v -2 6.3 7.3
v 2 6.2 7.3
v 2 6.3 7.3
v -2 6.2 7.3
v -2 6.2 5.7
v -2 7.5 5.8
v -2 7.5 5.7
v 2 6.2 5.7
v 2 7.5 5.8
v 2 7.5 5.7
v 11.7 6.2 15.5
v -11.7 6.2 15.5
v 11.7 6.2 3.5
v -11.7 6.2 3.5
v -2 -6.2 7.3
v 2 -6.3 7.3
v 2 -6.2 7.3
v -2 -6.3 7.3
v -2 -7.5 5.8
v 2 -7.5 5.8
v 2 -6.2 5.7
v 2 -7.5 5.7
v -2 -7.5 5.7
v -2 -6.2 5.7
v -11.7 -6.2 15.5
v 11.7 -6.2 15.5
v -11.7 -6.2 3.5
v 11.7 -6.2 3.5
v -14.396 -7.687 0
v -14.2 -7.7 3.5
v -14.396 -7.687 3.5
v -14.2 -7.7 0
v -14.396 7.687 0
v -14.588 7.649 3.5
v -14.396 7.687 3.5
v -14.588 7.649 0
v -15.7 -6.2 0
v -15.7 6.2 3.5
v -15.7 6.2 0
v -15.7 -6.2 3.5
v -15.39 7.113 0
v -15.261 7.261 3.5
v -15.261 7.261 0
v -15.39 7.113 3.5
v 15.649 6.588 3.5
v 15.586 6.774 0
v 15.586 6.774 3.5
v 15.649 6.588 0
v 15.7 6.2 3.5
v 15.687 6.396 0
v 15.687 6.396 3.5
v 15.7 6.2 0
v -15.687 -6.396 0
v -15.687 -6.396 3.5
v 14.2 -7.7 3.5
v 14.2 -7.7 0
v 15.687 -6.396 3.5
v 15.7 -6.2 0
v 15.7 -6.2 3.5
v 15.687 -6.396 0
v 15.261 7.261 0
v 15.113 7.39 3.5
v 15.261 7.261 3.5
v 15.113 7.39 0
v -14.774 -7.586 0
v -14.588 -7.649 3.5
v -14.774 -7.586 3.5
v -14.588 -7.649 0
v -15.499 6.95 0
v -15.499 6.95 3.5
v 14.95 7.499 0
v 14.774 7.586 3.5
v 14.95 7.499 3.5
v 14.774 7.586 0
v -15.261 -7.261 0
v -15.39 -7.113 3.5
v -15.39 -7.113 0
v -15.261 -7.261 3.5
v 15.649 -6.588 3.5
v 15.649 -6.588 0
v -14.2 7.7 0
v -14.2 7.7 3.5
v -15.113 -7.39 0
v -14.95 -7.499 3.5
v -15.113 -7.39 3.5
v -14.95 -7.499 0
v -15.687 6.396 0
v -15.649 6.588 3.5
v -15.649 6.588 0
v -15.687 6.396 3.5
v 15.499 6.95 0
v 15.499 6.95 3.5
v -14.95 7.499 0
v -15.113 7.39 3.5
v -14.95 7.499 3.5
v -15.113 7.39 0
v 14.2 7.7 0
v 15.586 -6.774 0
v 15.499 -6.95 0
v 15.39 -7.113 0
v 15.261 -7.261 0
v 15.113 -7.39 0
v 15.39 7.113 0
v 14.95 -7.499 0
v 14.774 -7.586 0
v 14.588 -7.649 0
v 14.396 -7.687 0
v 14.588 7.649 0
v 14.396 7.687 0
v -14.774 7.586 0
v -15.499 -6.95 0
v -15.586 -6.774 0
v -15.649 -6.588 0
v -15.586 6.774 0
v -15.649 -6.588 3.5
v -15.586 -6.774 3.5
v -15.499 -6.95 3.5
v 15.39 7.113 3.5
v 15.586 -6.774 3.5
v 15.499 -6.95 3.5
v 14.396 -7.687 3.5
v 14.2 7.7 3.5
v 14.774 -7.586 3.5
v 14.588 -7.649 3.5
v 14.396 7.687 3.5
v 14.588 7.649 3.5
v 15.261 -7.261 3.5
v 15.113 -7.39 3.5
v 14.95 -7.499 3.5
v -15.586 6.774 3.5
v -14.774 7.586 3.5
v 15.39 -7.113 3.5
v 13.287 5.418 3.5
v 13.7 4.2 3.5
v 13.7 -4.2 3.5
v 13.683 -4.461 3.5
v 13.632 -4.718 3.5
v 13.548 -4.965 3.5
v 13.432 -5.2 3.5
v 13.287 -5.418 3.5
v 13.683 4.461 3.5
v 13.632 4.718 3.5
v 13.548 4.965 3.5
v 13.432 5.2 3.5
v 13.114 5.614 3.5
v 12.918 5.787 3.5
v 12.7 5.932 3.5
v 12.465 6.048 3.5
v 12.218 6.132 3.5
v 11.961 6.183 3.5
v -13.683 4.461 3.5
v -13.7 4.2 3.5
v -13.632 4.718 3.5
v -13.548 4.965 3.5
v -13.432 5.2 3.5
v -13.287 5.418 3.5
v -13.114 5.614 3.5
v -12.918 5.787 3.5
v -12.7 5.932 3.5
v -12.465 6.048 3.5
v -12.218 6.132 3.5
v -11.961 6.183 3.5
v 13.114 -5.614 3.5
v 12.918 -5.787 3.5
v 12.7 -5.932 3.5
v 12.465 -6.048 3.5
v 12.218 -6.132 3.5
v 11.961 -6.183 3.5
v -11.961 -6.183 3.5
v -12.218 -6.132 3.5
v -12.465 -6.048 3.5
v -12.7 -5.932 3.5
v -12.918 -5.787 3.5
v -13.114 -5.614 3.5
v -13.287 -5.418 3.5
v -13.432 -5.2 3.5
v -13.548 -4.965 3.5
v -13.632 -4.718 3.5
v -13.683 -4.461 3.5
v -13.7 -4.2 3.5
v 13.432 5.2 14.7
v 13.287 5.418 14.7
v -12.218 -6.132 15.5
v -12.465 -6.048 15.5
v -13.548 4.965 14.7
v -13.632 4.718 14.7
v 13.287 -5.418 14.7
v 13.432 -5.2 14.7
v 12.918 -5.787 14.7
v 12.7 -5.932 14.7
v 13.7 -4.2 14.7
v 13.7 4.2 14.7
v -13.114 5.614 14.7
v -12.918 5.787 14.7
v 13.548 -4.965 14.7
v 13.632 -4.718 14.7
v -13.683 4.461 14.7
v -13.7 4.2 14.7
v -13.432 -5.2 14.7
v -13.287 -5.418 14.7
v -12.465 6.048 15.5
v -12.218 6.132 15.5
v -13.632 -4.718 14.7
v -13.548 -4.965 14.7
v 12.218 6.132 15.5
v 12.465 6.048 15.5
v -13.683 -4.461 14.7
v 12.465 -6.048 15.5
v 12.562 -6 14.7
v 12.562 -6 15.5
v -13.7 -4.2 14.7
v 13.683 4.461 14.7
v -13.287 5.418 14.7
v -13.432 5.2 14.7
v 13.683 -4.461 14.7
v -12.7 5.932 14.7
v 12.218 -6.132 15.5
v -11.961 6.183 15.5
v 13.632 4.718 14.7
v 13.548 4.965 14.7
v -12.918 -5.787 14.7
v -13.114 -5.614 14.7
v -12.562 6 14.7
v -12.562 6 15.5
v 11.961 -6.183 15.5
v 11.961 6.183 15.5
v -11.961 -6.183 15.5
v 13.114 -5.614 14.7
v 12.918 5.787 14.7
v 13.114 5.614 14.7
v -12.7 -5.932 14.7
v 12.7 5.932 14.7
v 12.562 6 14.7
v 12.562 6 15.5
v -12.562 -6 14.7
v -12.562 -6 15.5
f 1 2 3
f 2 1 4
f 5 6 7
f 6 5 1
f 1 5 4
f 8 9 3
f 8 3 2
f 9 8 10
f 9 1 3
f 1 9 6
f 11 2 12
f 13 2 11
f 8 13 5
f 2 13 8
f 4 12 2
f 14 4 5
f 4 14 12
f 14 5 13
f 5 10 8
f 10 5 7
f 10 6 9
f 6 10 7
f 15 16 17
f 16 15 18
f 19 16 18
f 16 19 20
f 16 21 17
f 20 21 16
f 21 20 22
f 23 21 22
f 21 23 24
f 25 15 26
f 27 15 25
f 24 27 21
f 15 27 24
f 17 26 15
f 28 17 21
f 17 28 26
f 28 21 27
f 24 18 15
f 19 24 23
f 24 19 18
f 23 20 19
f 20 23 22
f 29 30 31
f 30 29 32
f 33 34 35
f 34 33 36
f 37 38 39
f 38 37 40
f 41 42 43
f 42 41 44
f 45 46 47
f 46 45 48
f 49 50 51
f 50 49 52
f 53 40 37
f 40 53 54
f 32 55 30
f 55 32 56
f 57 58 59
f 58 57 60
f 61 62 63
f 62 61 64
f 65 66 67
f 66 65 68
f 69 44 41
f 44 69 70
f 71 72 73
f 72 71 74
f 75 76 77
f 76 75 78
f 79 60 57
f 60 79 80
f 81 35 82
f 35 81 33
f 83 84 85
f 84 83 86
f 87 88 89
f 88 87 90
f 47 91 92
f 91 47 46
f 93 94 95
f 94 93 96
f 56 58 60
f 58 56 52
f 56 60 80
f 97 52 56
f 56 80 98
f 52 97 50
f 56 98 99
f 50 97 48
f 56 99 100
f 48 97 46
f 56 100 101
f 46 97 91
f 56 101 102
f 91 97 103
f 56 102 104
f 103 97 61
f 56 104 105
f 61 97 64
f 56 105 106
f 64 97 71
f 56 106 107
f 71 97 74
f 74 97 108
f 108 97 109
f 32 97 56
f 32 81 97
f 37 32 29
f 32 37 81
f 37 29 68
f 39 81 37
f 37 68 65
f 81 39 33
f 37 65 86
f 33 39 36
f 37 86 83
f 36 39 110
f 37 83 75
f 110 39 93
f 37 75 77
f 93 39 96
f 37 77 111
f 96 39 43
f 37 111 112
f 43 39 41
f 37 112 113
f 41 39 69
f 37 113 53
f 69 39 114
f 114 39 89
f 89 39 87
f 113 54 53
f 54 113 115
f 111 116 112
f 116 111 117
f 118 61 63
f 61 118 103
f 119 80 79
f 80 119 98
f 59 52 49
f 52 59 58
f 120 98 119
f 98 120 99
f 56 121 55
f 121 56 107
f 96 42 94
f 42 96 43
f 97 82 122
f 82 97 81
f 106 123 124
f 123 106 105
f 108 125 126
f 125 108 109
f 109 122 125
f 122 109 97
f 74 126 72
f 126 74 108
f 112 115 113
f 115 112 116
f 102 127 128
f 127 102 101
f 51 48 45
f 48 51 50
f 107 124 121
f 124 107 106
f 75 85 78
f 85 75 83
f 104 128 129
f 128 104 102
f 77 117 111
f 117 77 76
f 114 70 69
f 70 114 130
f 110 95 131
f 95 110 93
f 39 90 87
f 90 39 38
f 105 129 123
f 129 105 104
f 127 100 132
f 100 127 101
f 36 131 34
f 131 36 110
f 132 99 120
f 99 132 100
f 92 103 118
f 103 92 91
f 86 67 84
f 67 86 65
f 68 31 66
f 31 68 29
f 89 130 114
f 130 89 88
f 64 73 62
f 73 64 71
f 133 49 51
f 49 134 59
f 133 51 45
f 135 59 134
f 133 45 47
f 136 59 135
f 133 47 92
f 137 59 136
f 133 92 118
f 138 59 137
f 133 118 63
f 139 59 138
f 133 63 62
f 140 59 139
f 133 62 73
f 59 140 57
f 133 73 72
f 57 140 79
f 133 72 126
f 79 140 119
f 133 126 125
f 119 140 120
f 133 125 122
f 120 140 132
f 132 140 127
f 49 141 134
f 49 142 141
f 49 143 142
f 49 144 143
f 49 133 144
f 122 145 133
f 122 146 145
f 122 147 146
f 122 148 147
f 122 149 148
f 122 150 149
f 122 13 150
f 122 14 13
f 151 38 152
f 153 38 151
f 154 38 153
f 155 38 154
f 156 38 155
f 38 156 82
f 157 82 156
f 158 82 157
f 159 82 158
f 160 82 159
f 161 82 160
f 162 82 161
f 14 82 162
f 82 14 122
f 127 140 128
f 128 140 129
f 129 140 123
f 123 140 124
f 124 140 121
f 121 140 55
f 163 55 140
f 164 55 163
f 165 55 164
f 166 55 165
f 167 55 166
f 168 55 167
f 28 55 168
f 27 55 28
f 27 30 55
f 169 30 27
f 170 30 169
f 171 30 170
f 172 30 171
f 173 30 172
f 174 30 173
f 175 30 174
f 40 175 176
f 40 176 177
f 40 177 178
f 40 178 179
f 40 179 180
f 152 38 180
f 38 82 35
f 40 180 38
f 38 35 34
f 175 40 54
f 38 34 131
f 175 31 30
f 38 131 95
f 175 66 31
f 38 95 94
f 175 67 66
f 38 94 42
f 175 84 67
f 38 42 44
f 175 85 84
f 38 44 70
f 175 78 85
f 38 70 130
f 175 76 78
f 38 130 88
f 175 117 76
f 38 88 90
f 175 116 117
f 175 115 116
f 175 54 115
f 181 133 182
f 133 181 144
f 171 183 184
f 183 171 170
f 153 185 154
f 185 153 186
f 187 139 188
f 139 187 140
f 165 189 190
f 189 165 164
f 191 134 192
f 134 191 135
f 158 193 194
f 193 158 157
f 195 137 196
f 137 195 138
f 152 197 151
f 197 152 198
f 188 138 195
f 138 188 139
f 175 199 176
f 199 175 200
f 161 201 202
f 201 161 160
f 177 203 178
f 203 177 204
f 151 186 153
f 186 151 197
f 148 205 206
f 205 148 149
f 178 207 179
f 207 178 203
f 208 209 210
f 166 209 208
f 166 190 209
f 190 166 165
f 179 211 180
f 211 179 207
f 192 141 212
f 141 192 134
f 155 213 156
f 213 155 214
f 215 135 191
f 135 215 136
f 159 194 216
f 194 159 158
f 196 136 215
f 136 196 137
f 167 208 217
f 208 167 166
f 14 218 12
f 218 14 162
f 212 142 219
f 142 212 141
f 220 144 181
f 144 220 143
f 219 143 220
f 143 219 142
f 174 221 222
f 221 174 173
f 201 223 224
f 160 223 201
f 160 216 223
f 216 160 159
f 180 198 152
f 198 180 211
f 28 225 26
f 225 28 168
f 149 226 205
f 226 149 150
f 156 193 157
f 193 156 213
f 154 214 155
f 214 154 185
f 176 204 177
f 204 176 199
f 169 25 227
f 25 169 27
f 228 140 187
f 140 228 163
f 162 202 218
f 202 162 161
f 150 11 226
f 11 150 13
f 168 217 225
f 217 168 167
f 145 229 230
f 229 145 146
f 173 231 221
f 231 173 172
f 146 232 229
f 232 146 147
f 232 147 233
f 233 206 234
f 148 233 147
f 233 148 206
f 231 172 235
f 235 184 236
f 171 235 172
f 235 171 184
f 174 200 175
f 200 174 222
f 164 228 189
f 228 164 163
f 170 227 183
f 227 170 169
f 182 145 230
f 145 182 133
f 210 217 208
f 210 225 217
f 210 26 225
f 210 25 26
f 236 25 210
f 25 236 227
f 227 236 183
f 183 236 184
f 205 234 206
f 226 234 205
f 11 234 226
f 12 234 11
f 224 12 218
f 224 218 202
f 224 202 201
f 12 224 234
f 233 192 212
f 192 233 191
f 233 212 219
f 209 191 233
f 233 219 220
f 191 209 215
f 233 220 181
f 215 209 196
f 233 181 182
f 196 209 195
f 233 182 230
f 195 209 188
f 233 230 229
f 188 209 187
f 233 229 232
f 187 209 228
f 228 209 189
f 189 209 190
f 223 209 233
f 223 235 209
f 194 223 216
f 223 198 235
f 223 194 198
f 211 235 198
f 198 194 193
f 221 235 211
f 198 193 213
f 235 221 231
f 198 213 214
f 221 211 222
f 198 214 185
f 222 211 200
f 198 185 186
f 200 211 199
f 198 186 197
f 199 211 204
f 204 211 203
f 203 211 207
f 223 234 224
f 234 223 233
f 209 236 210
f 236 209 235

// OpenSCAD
// file: parameters.scad
// ============================================
// MODULAR CABLE ORGANIZER - SHARED PARAMETERS
// ============================================
// All dimensions in mm - include this in all files
// ============================================

$fn = 48;

// === TOLERANCES ===
clearance = 0.3;
port_clearance = 0.1;  // Extra clearance for port openings (reduced - 0.2 was too loose for USB-C)
wall = 1.6;

// === SLOT DIMENSIONS (2:1 aspect ratio) - scaled to 2/3 ===
slot_width = 32;  // Reduced by 1mm for more compact insert
slot_height = 16;  // Reduced by 1mm for more compact insert
slot_depth = 4;  // Reduced from 6mm - less frame depth needed

// === FRAME STRUCTURE ===
frame_wall = 0.5;   // Reduced for more compact frame
frame_border = 8;  // Increased by 10mm for mounting holes with countersink
frame_back = 2;     // Slightly thicker for snap catch strength
mount_hole_dia = 3;
countersink_dia = 6;  // Diameter of countersink for screw heads
countersink_depth = 2;  // Depth of countersink

// === GRID ===
grid_cols = 2;
grid_rows = 2;

// === INSERT BASE DIMENSIONS ===
insert_width = slot_width - (2 * clearance);
insert_height = slot_height - (2 * clearance);
insert_base_depth = slot_depth - 0.5;

// === INSERT BODY (protrudes from frame) ===
insert_body_width = insert_width - 4;
insert_body_height = insert_height - 3;
insert_body_depth = 12;  // Deep enough to accommodate male cable connectors
insert_top_thick = 1.5;  // Top platform thickness

// === SNAP TABS (on neck/body - catch on back plate) ===
snap_tab_width = 4;
snap_tab_protrude = 1.2;  // How far tab sticks out from body
snap_tab_thick = 1.5;     // Z thickness of tab
snap_tab_offset = 2.2;      // Distance from base to tab bottom on insert (increased to clear frame)

// === CONNECTOR PORT DIMENSIONS & BODY DEPTHS ===
// Port dimensions from reference blueprints
// Body depths sized to match typical male connector lengths

// USB-C: 8.4 x 2.6mm, male connector ~9mm
usbc_w = 8.4;
usbc_h = 2.6;
usbc_r = 1.0;
usbc_body_depth = 9;

// USB-A: 14.0 x 6.5mm, male connector ~13mm
usba_w = 14.0;
usba_h = 6.5;
usba_r = 0.5;
usba_body_depth = 13;

// USB Mini: 6.9 x 3.0mm, male connector ~9mm
usb_mini_w = 6.9;
usb_mini_h = 3.0;
usb_mini_r = 0.5;
usb_mini_body_depth = 9;

// USB Micro: 6.9 x 1.8mm, male connector ~7mm
usb_micro_w = 6.9;
usb_micro_h = 1.8;
usb_micro_r = 0.3;
usb_micro_body_depth = 7;

// USB-B: 8.0 x 7.5mm, male connector ~14mm
usb_b_w = 8.0;
usb_b_h = 7.5;
usb_b_r = 1.0;
usb_b_body_depth = 14;

// Lightning: 6.7 x 1.5mm, male connector ~8mm
lightning_w = 6.7;
lightning_h = 1.5;
lightning_r = 0.5;
lightning_body_depth = 8;

// HDMI: 14.0 x 4.5mm, male connector ~16mm
hdmi_w = 14.0;
hdmi_h = 4.5;
hdmi_r = 0.5;
hdmi_body_depth = 16;

// 3.5mm Audio Jack: male plug ~14mm
audio_jack_dia = 6.0;
audio_jack_body_depth = 14;

// Blank/Label: recessed area for label
label_w = 30;
label_h = 12;
label_depth = 0.8;

// === CALCULATED VALUES ===
frame_total_depth = frame_back + slot_depth;
grid_width = (grid_cols * slot_width) + ((grid_cols - 1) * frame_wall);
grid_height = (grid_rows * slot_height) + ((grid_rows - 1) * frame_wall);
frame_width = grid_width + (2 * frame_border);
frame_height_total = grid_height + (2 * frame_border);
insert_total_depth = insert_base_depth + insert_body_depth;
// file: insert_base.scad
// ============================================
// MODULAR CABLE ORGANIZER - BASE INSERT MODULE
// ============================================
// This is the parent module for all insert types
// Include this file and call insert_with_port() with a port shape
// ============================================

include <parameters.scad>

// === BASE INSERT WITH CUSTOM BODY DEPTH ===
module insert_blank_custom(body_depth) {
    union() {
        // Base plate (sits in frame slot)
        rounded_box_rect(insert_width, insert_height, insert_base_depth, 1.5);
        
        // Body (protrudes out front) - custom depth
        translate([0, 0, insert_base_depth])
            rounded_box_rect(insert_body_width, insert_body_height, body_depth, 2);
        
        // Snap tabs on all 4 sides
        snap_tabs_all();
    }
}

// === BASE INSERT (default depth - for backwards compatibility) ===
module insert_blank() {
    insert_blank_custom(insert_body_depth);
}

// === INSERT WITH THROUGH-HOLE PORT (custom depth) ===
// Pass body_depth and a 2D shape as children
module insert_with_port_custom(body_depth) {
    total_depth = insert_base_depth + body_depth;
    difference() {
        insert_blank_custom(body_depth);
        
        // Cut port hole ALL THE WAY through (tube shape)
        translate([0, 0, -0.1])
            linear_extrude(total_depth + 0.2)
            offset(r=port_clearance)  // Add clearance to port opening
            children();
    }
}

// === INSERT WITH THROUGH-HOLE PORT (default depth) ===
module insert_with_port() {
    insert_with_port_custom(insert_body_depth) children();
}

// === PRE-MADE INSERT MODULES WITH CORRECT DEPTHS ===
module insert_usbc() {
    insert_with_port_custom(usbc_body_depth) port_usbc();
}

module insert_usba() {
    insert_with_port_custom(usba_body_depth) port_usba();
}

module insert_usb_mini() {
    insert_with_port_custom(usb_mini_body_depth) port_usb_mini();
}

module insert_usb_micro() {
    insert_with_port_custom(usb_micro_body_depth) port_usb_micro();
}

module insert_usb_b() {
    insert_with_port_custom(usb_b_body_depth) port_usb_b();
}

module insert_lightning() {
    insert_with_port_custom(lightning_body_depth) port_lightning();
}

module insert_hdmi() {
    insert_with_port_custom(hdmi_body_depth) port_hdmi();
}

module insert_audio_jack() {
    insert_with_port_custom(audio_jack_body_depth) port_audio_jack();
}

// === SNAP TABS (on neck/body - catch on frame cutouts) ===
// Tabs are on the body, positioned to engage with frame wall cutouts
module snap_tabs_all() {
    // Position tabs up on body (clear of base/frame)
    tab_z = insert_base_depth + snap_tab_offset;
    
    // Tabs on all 4 sides of the body
    for (angle = [0, 90, 180, 270]) {
        rotate([0, 0, angle])
            translate([0, insert_body_height/2, tab_z])
            neck_snap_tab();
    }
}

module neck_snap_tab() {
    // Wedge shape (FLIPPED): 
    // - Peak/taper on BOTTOM - slides past back plate when inserting
    // - Flat on TOP - catches and holds
    hull() {
        // Peak of wedge (protruding, at BOTTOM of tab)
        translate([-snap_tab_width/2, snap_tab_protrude, 0])
            cube([snap_tab_width, 0.1, 0.1]);
        // Flat top (at body surface, TOP of tab)
        translate([-snap_tab_width/2, 0, snap_tab_thick])
            cube([snap_tab_width, 0.1, 0.1]);
        // Base of wedge (at body surface, bottom)
        translate([-snap_tab_width/2, 0, 0])
            cube([snap_tab_width, 0.1, 0.1]);
    }
}

module snap_tab_horizontal() {
    hull() {
        translate([0, -snap_tab_protrude/2, 0])
            cube([snap_tab_width, 0.1, snap_tab_thick], center=true);
        translate([0, snap_tab_protrude/2, snap_tab_thick * 0.2])
            cube([snap_tab_width, 0.1, snap_tab_thick * 0.6], center=true);
    }
}

module snap_tab_vertical() {
    hull() {
        translate([-snap_tab_protrude/2, 0, 0])
            cube([0.1, snap_tab_width, snap_tab_thick], center=true);
        translate([snap_tab_protrude/2, 0, snap_tab_thick * 0.2])
            cube([0.1, snap_tab_width, snap_tab_thick * 0.6], center=true);
    }
}

// === UTILITY MODULES ===
module rounded_box_rect(w, d, h, r) {
    translate([0, 0, h/2])
        hull() {
            for (x = [-1, 1], y = [-1, 1])
                translate([x * (w/2 - r), y * (d/2 - r), 0])
                    cylinder(h=h, r=r, center=true);
        }
}

// === PORT SHAPE MODULES (2D) ===
// These define the cutout shapes for each connector type

module port_rounded_rect(w, h, r) {
    // Standard rounded rectangle
    hull() {
        for (x = [-1, 1], y = [-1, 1])
            translate([x * (w/2 - r), y * (h/2 - r)])
                circle(r=r);
    }
}

module port_usbc() {
    port_rounded_rect(usbc_w, usbc_h, usbc_r);
}

module port_usba() {
    port_rounded_rect(usba_w, usba_h, usba_r);
}

module port_usb_mini() {
    port_rounded_rect(usb_mini_w, usb_mini_h, usb_mini_r);
}

module port_usb_micro() {
    port_rounded_rect(usb_micro_w, usb_micro_h, usb_micro_r);
}

module port_usb_b() {
    // USB-B has beveled top corners
    hull() {
        // Bottom corners (full radius)
        for (x = [-1, 1])
            translate([x * (usb_b_w/2 - usb_b_r), -(usb_b_h/2 - usb_b_r)])
                circle(r=usb_b_r);
        // Top corners (chamfered - moved inward)
        for (x = [-1, 1])
            translate([x * (usb_b_w/2 - usb_b_r - 1), (usb_b_h/2 - usb_b_r)])
                circle(r=usb_b_r);
    }
}

module port_lightning() {
    port_rounded_rect(lightning_w, lightning_h, lightning_r);
}

module port_hdmi() {
    // HDMI is tapered (wider at top)
    hull() {
        // Top (wider)
        for (x = [-1, 1])
            translate([x * (hdmi_w/2 - hdmi_r), (hdmi_h/2 - hdmi_r)])
                circle(r=hdmi_r);
        // Bottom (narrower)
        for (x = [-1, 1])
            translate([x * (hdmi_w/2 - hdmi_r - 1), -(hdmi_h/2 - hdmi_r)])
                circle(r=hdmi_r);
    }
}

module port_audio_jack() {
    circle(d=audio_jack_dia);
}

module port_label_recess() {
    // Shallow rectangular recess for labels
    square([label_w, label_h], center=true);
}

// === RENDER (for testing this file directly) ===
// insert_blank();
// main file
// ============================================
// BLANK / LABEL PLATE INSERT
// Shallow recess for adhesive label
// ============================================

include <insert_base.scad>

module insert_blank_label() {
    difference() {
        insert_blank();
        
        // Shallow recess on top for label
        translate([0, 0, insert_total_depth - label_depth])
            linear_extrude(label_depth + 0.1)
            square([label_w, label_h], center=true);
    }
}

// Render
insert_blank_label();
